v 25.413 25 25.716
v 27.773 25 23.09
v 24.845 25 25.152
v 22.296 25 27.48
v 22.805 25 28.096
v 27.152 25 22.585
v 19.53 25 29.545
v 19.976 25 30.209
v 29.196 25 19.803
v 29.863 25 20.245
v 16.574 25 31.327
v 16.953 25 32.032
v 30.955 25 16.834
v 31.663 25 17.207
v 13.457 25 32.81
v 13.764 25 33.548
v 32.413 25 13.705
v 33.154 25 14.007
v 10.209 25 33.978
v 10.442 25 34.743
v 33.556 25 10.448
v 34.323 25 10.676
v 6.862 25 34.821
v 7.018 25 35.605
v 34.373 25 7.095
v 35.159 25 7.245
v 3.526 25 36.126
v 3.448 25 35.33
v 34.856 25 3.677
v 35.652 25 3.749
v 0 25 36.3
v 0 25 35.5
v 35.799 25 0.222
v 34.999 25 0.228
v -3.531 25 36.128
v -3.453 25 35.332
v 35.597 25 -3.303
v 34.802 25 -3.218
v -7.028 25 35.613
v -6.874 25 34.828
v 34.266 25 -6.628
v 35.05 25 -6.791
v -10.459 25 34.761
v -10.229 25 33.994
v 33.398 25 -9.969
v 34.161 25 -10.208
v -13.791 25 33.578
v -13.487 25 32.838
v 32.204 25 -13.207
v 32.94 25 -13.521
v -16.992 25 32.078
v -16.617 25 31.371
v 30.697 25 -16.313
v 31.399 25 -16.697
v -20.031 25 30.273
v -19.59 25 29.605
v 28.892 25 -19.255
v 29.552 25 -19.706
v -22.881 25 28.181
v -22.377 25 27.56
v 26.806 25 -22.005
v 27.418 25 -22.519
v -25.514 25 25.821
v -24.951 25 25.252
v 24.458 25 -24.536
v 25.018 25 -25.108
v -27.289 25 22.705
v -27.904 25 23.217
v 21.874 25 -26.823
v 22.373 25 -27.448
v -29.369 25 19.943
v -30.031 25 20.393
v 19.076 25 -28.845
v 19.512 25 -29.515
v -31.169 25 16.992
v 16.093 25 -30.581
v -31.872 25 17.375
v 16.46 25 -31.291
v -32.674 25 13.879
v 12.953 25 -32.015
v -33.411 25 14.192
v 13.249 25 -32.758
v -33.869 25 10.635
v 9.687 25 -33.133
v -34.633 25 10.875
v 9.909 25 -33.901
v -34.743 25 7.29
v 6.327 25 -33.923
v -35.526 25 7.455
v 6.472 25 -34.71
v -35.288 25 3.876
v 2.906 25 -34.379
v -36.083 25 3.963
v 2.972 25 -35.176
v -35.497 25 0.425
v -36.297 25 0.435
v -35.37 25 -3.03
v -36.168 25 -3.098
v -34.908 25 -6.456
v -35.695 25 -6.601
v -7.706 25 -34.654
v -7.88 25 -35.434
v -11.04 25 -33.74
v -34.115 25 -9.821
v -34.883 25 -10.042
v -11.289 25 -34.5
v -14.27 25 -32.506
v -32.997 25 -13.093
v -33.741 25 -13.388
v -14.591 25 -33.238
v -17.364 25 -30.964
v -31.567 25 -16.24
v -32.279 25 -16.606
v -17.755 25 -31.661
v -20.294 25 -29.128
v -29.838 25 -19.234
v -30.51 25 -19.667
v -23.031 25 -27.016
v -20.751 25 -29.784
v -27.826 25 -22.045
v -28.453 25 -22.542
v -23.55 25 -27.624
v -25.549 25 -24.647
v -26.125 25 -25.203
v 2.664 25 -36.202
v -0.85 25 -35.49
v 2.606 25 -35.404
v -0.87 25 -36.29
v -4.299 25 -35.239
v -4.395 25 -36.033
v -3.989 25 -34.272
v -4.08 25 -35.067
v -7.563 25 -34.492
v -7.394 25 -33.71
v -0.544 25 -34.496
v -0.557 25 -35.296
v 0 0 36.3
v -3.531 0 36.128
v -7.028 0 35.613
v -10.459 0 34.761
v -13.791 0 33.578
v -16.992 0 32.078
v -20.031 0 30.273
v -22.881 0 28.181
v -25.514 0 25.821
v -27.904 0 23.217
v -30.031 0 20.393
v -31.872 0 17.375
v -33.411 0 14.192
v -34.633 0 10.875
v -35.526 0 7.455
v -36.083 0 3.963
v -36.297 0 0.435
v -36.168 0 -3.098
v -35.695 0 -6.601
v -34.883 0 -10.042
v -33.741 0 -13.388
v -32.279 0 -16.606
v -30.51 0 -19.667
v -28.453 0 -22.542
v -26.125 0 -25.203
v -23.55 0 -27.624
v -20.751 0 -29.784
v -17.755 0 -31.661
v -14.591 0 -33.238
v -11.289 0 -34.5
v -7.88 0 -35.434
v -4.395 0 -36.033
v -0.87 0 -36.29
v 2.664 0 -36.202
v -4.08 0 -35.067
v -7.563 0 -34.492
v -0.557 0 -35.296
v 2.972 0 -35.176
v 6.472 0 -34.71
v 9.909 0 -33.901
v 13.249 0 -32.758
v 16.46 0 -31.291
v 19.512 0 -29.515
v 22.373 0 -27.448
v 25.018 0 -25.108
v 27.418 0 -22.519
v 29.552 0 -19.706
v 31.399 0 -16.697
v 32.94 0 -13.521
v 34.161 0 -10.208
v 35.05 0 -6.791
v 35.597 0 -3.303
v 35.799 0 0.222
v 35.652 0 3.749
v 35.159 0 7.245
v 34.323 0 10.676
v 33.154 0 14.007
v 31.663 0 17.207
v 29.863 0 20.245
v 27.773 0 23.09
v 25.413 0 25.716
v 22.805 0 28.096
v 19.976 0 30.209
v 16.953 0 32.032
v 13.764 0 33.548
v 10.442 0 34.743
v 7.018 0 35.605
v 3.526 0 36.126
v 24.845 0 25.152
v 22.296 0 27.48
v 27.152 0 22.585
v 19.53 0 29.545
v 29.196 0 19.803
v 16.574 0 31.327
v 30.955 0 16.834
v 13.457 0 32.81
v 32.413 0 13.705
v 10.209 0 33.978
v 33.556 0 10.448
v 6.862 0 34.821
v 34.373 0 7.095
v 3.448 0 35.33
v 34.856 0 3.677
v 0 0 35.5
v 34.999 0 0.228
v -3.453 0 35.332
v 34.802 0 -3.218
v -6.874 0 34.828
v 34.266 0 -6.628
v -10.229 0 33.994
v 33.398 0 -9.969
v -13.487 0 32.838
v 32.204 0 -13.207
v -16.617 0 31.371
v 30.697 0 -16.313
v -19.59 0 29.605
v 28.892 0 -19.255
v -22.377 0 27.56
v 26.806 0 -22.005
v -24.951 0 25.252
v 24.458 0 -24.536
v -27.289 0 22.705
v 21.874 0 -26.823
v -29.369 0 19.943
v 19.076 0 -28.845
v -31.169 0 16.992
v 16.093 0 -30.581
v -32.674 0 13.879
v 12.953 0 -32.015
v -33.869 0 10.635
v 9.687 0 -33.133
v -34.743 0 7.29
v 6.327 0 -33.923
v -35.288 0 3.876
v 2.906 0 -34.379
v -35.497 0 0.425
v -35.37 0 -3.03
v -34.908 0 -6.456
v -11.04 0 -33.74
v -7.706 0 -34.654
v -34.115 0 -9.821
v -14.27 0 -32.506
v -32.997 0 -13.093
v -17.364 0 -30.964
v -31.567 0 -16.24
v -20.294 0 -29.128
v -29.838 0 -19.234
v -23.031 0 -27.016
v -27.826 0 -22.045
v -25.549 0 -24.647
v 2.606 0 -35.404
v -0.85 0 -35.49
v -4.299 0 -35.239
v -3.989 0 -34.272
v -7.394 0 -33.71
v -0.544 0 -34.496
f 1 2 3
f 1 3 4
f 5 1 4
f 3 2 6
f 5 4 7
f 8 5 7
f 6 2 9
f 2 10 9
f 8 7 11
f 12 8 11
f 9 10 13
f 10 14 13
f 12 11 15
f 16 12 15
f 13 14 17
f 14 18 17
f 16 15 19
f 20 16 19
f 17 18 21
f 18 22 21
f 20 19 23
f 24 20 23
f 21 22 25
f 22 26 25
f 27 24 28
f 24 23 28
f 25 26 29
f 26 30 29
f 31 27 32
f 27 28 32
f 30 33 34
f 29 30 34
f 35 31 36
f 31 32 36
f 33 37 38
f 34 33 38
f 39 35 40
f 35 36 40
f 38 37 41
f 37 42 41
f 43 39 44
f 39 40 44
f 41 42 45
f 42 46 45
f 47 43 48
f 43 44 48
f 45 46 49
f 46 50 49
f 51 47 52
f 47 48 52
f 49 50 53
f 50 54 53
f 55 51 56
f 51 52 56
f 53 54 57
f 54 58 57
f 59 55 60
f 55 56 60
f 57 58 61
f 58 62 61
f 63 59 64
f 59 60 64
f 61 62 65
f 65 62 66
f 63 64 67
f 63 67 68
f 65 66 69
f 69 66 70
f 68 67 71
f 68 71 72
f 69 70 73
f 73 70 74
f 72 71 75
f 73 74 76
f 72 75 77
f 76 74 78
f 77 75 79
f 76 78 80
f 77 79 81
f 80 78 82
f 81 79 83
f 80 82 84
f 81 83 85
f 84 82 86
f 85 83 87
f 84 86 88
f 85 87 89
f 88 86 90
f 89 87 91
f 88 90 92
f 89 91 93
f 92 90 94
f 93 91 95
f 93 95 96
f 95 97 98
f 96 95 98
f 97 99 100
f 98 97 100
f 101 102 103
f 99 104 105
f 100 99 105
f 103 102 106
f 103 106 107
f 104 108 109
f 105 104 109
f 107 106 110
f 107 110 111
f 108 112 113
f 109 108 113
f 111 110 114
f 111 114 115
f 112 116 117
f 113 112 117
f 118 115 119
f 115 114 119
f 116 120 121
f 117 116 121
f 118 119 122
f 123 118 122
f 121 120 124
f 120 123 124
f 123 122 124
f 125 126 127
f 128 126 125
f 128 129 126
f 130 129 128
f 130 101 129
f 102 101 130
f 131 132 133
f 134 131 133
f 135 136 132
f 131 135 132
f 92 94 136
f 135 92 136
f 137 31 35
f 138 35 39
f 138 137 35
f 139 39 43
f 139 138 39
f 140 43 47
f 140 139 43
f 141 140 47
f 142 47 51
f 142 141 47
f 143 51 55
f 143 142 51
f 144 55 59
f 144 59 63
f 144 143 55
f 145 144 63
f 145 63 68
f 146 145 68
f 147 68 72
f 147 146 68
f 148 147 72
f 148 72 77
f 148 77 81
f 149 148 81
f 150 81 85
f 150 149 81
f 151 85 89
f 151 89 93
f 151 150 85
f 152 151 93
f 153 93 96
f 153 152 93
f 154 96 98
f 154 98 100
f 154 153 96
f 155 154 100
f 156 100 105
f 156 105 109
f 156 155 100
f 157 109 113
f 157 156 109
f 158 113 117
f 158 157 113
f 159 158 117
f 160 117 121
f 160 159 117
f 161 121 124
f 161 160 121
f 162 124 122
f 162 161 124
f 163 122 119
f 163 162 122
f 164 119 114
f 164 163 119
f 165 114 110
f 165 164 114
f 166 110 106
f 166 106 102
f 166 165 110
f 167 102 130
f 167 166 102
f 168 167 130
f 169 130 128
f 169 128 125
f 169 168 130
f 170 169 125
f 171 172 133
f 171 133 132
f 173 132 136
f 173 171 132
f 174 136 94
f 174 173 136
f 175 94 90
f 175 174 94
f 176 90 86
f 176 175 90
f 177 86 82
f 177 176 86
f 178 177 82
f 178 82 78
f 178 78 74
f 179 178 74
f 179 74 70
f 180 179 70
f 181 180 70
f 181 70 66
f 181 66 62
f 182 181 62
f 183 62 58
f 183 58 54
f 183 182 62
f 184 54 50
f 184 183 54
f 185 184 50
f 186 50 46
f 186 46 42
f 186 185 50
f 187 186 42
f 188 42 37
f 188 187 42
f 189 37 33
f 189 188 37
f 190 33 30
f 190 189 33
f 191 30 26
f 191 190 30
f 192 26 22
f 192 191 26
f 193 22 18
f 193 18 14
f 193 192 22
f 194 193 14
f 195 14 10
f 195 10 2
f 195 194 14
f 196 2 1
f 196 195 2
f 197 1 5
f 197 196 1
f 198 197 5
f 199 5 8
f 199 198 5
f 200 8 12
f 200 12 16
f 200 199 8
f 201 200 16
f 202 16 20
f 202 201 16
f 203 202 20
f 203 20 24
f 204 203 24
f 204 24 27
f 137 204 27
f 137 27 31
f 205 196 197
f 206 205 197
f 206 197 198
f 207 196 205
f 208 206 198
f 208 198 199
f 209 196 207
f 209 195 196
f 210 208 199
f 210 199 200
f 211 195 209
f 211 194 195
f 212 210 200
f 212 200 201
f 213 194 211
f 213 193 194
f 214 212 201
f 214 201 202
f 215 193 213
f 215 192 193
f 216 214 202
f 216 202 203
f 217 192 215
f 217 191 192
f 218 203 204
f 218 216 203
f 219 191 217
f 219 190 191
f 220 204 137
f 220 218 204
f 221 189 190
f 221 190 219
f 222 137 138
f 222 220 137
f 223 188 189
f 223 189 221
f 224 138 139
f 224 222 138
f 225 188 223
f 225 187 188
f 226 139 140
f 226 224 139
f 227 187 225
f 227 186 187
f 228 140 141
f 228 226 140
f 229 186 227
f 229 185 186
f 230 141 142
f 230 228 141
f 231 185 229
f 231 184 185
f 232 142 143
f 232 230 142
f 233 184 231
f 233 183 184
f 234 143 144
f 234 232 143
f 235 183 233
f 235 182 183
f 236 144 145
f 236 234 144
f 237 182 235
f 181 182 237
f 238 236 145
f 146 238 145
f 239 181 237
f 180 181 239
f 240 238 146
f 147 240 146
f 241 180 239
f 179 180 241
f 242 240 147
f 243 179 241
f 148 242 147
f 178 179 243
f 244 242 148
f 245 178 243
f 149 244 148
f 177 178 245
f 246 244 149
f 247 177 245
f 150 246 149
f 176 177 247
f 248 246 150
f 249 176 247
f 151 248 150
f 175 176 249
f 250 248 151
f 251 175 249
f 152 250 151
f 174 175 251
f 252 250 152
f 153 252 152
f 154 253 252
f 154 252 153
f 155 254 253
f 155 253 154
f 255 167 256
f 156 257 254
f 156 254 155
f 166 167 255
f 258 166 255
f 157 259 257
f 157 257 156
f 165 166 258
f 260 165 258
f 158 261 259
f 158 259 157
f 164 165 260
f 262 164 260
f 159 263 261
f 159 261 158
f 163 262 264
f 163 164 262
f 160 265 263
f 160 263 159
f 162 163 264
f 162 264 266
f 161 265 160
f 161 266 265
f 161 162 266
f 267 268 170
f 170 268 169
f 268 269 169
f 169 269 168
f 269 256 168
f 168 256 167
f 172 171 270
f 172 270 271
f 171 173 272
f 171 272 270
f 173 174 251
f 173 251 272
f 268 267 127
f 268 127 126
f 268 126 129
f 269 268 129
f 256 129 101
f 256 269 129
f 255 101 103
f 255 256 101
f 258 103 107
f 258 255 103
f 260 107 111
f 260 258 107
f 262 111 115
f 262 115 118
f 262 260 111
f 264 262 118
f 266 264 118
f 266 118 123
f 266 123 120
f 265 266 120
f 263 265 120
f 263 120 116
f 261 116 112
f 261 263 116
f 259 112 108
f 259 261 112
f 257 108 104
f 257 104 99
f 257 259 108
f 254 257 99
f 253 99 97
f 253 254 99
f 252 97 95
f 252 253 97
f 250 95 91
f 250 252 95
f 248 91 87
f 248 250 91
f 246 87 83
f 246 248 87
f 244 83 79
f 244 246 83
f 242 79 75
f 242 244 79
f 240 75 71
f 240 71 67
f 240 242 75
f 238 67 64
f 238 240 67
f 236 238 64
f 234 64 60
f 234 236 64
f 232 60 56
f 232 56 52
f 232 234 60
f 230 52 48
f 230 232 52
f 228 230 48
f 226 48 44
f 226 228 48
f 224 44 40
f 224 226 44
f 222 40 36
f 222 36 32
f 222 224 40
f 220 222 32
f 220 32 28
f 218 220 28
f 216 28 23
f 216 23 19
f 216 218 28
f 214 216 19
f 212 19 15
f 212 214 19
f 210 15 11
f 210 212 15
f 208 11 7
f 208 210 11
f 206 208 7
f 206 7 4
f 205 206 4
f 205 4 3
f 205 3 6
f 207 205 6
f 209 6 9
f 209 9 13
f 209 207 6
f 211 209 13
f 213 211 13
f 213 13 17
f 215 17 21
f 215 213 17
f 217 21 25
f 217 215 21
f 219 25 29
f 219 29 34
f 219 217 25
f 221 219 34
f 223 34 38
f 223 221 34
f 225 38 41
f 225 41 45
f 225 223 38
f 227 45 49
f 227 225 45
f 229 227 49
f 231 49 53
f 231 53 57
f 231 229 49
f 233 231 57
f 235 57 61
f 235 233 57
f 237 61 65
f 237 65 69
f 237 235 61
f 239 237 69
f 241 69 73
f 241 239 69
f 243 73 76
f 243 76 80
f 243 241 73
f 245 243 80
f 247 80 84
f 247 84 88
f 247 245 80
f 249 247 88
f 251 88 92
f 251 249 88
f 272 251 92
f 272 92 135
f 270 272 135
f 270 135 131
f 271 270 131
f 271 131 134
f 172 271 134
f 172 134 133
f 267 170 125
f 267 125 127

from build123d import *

# Parameters (mm, degrees)
BASE_FLANGE1_DEPTH = 25


# Sheet-metal steps are written as plain solids
with BuildPart() as part:
    # Sketch1 → Base-Flange1 (new body)
    with BuildSketch(Plane(origin=(0, 0, 0), x_dir=(1, 0, 0), z_dir=(0, 1, 0))):
        with BuildLine():
            ThreePointArc((2.605767321, 35.404236705), (-35.476051098, 1.303763201), (0, -35.5))
            ThreePointArc((0, -35.5), (34.801944096, 3.21815642), (-7.394232679, 33.710017876))
            Line((-7.394232679, 33.710017876), (-7.563243712, 34.491961142))
            ThreePointArc((-7.563243712, 34.491961142), (35.597417103, 3.303142853), (0, -36.3))
            ThreePointArc((0, -36.3), (-36.275511405, 1.33314378), (2.664488838, 36.202078659))
            Line((2.664488838, 36.202078659), (2.605767321, 35.404236705))
        make_face()
    extrude(amount=BASE_FLANGE1_DEPTH)


solid = part.part
